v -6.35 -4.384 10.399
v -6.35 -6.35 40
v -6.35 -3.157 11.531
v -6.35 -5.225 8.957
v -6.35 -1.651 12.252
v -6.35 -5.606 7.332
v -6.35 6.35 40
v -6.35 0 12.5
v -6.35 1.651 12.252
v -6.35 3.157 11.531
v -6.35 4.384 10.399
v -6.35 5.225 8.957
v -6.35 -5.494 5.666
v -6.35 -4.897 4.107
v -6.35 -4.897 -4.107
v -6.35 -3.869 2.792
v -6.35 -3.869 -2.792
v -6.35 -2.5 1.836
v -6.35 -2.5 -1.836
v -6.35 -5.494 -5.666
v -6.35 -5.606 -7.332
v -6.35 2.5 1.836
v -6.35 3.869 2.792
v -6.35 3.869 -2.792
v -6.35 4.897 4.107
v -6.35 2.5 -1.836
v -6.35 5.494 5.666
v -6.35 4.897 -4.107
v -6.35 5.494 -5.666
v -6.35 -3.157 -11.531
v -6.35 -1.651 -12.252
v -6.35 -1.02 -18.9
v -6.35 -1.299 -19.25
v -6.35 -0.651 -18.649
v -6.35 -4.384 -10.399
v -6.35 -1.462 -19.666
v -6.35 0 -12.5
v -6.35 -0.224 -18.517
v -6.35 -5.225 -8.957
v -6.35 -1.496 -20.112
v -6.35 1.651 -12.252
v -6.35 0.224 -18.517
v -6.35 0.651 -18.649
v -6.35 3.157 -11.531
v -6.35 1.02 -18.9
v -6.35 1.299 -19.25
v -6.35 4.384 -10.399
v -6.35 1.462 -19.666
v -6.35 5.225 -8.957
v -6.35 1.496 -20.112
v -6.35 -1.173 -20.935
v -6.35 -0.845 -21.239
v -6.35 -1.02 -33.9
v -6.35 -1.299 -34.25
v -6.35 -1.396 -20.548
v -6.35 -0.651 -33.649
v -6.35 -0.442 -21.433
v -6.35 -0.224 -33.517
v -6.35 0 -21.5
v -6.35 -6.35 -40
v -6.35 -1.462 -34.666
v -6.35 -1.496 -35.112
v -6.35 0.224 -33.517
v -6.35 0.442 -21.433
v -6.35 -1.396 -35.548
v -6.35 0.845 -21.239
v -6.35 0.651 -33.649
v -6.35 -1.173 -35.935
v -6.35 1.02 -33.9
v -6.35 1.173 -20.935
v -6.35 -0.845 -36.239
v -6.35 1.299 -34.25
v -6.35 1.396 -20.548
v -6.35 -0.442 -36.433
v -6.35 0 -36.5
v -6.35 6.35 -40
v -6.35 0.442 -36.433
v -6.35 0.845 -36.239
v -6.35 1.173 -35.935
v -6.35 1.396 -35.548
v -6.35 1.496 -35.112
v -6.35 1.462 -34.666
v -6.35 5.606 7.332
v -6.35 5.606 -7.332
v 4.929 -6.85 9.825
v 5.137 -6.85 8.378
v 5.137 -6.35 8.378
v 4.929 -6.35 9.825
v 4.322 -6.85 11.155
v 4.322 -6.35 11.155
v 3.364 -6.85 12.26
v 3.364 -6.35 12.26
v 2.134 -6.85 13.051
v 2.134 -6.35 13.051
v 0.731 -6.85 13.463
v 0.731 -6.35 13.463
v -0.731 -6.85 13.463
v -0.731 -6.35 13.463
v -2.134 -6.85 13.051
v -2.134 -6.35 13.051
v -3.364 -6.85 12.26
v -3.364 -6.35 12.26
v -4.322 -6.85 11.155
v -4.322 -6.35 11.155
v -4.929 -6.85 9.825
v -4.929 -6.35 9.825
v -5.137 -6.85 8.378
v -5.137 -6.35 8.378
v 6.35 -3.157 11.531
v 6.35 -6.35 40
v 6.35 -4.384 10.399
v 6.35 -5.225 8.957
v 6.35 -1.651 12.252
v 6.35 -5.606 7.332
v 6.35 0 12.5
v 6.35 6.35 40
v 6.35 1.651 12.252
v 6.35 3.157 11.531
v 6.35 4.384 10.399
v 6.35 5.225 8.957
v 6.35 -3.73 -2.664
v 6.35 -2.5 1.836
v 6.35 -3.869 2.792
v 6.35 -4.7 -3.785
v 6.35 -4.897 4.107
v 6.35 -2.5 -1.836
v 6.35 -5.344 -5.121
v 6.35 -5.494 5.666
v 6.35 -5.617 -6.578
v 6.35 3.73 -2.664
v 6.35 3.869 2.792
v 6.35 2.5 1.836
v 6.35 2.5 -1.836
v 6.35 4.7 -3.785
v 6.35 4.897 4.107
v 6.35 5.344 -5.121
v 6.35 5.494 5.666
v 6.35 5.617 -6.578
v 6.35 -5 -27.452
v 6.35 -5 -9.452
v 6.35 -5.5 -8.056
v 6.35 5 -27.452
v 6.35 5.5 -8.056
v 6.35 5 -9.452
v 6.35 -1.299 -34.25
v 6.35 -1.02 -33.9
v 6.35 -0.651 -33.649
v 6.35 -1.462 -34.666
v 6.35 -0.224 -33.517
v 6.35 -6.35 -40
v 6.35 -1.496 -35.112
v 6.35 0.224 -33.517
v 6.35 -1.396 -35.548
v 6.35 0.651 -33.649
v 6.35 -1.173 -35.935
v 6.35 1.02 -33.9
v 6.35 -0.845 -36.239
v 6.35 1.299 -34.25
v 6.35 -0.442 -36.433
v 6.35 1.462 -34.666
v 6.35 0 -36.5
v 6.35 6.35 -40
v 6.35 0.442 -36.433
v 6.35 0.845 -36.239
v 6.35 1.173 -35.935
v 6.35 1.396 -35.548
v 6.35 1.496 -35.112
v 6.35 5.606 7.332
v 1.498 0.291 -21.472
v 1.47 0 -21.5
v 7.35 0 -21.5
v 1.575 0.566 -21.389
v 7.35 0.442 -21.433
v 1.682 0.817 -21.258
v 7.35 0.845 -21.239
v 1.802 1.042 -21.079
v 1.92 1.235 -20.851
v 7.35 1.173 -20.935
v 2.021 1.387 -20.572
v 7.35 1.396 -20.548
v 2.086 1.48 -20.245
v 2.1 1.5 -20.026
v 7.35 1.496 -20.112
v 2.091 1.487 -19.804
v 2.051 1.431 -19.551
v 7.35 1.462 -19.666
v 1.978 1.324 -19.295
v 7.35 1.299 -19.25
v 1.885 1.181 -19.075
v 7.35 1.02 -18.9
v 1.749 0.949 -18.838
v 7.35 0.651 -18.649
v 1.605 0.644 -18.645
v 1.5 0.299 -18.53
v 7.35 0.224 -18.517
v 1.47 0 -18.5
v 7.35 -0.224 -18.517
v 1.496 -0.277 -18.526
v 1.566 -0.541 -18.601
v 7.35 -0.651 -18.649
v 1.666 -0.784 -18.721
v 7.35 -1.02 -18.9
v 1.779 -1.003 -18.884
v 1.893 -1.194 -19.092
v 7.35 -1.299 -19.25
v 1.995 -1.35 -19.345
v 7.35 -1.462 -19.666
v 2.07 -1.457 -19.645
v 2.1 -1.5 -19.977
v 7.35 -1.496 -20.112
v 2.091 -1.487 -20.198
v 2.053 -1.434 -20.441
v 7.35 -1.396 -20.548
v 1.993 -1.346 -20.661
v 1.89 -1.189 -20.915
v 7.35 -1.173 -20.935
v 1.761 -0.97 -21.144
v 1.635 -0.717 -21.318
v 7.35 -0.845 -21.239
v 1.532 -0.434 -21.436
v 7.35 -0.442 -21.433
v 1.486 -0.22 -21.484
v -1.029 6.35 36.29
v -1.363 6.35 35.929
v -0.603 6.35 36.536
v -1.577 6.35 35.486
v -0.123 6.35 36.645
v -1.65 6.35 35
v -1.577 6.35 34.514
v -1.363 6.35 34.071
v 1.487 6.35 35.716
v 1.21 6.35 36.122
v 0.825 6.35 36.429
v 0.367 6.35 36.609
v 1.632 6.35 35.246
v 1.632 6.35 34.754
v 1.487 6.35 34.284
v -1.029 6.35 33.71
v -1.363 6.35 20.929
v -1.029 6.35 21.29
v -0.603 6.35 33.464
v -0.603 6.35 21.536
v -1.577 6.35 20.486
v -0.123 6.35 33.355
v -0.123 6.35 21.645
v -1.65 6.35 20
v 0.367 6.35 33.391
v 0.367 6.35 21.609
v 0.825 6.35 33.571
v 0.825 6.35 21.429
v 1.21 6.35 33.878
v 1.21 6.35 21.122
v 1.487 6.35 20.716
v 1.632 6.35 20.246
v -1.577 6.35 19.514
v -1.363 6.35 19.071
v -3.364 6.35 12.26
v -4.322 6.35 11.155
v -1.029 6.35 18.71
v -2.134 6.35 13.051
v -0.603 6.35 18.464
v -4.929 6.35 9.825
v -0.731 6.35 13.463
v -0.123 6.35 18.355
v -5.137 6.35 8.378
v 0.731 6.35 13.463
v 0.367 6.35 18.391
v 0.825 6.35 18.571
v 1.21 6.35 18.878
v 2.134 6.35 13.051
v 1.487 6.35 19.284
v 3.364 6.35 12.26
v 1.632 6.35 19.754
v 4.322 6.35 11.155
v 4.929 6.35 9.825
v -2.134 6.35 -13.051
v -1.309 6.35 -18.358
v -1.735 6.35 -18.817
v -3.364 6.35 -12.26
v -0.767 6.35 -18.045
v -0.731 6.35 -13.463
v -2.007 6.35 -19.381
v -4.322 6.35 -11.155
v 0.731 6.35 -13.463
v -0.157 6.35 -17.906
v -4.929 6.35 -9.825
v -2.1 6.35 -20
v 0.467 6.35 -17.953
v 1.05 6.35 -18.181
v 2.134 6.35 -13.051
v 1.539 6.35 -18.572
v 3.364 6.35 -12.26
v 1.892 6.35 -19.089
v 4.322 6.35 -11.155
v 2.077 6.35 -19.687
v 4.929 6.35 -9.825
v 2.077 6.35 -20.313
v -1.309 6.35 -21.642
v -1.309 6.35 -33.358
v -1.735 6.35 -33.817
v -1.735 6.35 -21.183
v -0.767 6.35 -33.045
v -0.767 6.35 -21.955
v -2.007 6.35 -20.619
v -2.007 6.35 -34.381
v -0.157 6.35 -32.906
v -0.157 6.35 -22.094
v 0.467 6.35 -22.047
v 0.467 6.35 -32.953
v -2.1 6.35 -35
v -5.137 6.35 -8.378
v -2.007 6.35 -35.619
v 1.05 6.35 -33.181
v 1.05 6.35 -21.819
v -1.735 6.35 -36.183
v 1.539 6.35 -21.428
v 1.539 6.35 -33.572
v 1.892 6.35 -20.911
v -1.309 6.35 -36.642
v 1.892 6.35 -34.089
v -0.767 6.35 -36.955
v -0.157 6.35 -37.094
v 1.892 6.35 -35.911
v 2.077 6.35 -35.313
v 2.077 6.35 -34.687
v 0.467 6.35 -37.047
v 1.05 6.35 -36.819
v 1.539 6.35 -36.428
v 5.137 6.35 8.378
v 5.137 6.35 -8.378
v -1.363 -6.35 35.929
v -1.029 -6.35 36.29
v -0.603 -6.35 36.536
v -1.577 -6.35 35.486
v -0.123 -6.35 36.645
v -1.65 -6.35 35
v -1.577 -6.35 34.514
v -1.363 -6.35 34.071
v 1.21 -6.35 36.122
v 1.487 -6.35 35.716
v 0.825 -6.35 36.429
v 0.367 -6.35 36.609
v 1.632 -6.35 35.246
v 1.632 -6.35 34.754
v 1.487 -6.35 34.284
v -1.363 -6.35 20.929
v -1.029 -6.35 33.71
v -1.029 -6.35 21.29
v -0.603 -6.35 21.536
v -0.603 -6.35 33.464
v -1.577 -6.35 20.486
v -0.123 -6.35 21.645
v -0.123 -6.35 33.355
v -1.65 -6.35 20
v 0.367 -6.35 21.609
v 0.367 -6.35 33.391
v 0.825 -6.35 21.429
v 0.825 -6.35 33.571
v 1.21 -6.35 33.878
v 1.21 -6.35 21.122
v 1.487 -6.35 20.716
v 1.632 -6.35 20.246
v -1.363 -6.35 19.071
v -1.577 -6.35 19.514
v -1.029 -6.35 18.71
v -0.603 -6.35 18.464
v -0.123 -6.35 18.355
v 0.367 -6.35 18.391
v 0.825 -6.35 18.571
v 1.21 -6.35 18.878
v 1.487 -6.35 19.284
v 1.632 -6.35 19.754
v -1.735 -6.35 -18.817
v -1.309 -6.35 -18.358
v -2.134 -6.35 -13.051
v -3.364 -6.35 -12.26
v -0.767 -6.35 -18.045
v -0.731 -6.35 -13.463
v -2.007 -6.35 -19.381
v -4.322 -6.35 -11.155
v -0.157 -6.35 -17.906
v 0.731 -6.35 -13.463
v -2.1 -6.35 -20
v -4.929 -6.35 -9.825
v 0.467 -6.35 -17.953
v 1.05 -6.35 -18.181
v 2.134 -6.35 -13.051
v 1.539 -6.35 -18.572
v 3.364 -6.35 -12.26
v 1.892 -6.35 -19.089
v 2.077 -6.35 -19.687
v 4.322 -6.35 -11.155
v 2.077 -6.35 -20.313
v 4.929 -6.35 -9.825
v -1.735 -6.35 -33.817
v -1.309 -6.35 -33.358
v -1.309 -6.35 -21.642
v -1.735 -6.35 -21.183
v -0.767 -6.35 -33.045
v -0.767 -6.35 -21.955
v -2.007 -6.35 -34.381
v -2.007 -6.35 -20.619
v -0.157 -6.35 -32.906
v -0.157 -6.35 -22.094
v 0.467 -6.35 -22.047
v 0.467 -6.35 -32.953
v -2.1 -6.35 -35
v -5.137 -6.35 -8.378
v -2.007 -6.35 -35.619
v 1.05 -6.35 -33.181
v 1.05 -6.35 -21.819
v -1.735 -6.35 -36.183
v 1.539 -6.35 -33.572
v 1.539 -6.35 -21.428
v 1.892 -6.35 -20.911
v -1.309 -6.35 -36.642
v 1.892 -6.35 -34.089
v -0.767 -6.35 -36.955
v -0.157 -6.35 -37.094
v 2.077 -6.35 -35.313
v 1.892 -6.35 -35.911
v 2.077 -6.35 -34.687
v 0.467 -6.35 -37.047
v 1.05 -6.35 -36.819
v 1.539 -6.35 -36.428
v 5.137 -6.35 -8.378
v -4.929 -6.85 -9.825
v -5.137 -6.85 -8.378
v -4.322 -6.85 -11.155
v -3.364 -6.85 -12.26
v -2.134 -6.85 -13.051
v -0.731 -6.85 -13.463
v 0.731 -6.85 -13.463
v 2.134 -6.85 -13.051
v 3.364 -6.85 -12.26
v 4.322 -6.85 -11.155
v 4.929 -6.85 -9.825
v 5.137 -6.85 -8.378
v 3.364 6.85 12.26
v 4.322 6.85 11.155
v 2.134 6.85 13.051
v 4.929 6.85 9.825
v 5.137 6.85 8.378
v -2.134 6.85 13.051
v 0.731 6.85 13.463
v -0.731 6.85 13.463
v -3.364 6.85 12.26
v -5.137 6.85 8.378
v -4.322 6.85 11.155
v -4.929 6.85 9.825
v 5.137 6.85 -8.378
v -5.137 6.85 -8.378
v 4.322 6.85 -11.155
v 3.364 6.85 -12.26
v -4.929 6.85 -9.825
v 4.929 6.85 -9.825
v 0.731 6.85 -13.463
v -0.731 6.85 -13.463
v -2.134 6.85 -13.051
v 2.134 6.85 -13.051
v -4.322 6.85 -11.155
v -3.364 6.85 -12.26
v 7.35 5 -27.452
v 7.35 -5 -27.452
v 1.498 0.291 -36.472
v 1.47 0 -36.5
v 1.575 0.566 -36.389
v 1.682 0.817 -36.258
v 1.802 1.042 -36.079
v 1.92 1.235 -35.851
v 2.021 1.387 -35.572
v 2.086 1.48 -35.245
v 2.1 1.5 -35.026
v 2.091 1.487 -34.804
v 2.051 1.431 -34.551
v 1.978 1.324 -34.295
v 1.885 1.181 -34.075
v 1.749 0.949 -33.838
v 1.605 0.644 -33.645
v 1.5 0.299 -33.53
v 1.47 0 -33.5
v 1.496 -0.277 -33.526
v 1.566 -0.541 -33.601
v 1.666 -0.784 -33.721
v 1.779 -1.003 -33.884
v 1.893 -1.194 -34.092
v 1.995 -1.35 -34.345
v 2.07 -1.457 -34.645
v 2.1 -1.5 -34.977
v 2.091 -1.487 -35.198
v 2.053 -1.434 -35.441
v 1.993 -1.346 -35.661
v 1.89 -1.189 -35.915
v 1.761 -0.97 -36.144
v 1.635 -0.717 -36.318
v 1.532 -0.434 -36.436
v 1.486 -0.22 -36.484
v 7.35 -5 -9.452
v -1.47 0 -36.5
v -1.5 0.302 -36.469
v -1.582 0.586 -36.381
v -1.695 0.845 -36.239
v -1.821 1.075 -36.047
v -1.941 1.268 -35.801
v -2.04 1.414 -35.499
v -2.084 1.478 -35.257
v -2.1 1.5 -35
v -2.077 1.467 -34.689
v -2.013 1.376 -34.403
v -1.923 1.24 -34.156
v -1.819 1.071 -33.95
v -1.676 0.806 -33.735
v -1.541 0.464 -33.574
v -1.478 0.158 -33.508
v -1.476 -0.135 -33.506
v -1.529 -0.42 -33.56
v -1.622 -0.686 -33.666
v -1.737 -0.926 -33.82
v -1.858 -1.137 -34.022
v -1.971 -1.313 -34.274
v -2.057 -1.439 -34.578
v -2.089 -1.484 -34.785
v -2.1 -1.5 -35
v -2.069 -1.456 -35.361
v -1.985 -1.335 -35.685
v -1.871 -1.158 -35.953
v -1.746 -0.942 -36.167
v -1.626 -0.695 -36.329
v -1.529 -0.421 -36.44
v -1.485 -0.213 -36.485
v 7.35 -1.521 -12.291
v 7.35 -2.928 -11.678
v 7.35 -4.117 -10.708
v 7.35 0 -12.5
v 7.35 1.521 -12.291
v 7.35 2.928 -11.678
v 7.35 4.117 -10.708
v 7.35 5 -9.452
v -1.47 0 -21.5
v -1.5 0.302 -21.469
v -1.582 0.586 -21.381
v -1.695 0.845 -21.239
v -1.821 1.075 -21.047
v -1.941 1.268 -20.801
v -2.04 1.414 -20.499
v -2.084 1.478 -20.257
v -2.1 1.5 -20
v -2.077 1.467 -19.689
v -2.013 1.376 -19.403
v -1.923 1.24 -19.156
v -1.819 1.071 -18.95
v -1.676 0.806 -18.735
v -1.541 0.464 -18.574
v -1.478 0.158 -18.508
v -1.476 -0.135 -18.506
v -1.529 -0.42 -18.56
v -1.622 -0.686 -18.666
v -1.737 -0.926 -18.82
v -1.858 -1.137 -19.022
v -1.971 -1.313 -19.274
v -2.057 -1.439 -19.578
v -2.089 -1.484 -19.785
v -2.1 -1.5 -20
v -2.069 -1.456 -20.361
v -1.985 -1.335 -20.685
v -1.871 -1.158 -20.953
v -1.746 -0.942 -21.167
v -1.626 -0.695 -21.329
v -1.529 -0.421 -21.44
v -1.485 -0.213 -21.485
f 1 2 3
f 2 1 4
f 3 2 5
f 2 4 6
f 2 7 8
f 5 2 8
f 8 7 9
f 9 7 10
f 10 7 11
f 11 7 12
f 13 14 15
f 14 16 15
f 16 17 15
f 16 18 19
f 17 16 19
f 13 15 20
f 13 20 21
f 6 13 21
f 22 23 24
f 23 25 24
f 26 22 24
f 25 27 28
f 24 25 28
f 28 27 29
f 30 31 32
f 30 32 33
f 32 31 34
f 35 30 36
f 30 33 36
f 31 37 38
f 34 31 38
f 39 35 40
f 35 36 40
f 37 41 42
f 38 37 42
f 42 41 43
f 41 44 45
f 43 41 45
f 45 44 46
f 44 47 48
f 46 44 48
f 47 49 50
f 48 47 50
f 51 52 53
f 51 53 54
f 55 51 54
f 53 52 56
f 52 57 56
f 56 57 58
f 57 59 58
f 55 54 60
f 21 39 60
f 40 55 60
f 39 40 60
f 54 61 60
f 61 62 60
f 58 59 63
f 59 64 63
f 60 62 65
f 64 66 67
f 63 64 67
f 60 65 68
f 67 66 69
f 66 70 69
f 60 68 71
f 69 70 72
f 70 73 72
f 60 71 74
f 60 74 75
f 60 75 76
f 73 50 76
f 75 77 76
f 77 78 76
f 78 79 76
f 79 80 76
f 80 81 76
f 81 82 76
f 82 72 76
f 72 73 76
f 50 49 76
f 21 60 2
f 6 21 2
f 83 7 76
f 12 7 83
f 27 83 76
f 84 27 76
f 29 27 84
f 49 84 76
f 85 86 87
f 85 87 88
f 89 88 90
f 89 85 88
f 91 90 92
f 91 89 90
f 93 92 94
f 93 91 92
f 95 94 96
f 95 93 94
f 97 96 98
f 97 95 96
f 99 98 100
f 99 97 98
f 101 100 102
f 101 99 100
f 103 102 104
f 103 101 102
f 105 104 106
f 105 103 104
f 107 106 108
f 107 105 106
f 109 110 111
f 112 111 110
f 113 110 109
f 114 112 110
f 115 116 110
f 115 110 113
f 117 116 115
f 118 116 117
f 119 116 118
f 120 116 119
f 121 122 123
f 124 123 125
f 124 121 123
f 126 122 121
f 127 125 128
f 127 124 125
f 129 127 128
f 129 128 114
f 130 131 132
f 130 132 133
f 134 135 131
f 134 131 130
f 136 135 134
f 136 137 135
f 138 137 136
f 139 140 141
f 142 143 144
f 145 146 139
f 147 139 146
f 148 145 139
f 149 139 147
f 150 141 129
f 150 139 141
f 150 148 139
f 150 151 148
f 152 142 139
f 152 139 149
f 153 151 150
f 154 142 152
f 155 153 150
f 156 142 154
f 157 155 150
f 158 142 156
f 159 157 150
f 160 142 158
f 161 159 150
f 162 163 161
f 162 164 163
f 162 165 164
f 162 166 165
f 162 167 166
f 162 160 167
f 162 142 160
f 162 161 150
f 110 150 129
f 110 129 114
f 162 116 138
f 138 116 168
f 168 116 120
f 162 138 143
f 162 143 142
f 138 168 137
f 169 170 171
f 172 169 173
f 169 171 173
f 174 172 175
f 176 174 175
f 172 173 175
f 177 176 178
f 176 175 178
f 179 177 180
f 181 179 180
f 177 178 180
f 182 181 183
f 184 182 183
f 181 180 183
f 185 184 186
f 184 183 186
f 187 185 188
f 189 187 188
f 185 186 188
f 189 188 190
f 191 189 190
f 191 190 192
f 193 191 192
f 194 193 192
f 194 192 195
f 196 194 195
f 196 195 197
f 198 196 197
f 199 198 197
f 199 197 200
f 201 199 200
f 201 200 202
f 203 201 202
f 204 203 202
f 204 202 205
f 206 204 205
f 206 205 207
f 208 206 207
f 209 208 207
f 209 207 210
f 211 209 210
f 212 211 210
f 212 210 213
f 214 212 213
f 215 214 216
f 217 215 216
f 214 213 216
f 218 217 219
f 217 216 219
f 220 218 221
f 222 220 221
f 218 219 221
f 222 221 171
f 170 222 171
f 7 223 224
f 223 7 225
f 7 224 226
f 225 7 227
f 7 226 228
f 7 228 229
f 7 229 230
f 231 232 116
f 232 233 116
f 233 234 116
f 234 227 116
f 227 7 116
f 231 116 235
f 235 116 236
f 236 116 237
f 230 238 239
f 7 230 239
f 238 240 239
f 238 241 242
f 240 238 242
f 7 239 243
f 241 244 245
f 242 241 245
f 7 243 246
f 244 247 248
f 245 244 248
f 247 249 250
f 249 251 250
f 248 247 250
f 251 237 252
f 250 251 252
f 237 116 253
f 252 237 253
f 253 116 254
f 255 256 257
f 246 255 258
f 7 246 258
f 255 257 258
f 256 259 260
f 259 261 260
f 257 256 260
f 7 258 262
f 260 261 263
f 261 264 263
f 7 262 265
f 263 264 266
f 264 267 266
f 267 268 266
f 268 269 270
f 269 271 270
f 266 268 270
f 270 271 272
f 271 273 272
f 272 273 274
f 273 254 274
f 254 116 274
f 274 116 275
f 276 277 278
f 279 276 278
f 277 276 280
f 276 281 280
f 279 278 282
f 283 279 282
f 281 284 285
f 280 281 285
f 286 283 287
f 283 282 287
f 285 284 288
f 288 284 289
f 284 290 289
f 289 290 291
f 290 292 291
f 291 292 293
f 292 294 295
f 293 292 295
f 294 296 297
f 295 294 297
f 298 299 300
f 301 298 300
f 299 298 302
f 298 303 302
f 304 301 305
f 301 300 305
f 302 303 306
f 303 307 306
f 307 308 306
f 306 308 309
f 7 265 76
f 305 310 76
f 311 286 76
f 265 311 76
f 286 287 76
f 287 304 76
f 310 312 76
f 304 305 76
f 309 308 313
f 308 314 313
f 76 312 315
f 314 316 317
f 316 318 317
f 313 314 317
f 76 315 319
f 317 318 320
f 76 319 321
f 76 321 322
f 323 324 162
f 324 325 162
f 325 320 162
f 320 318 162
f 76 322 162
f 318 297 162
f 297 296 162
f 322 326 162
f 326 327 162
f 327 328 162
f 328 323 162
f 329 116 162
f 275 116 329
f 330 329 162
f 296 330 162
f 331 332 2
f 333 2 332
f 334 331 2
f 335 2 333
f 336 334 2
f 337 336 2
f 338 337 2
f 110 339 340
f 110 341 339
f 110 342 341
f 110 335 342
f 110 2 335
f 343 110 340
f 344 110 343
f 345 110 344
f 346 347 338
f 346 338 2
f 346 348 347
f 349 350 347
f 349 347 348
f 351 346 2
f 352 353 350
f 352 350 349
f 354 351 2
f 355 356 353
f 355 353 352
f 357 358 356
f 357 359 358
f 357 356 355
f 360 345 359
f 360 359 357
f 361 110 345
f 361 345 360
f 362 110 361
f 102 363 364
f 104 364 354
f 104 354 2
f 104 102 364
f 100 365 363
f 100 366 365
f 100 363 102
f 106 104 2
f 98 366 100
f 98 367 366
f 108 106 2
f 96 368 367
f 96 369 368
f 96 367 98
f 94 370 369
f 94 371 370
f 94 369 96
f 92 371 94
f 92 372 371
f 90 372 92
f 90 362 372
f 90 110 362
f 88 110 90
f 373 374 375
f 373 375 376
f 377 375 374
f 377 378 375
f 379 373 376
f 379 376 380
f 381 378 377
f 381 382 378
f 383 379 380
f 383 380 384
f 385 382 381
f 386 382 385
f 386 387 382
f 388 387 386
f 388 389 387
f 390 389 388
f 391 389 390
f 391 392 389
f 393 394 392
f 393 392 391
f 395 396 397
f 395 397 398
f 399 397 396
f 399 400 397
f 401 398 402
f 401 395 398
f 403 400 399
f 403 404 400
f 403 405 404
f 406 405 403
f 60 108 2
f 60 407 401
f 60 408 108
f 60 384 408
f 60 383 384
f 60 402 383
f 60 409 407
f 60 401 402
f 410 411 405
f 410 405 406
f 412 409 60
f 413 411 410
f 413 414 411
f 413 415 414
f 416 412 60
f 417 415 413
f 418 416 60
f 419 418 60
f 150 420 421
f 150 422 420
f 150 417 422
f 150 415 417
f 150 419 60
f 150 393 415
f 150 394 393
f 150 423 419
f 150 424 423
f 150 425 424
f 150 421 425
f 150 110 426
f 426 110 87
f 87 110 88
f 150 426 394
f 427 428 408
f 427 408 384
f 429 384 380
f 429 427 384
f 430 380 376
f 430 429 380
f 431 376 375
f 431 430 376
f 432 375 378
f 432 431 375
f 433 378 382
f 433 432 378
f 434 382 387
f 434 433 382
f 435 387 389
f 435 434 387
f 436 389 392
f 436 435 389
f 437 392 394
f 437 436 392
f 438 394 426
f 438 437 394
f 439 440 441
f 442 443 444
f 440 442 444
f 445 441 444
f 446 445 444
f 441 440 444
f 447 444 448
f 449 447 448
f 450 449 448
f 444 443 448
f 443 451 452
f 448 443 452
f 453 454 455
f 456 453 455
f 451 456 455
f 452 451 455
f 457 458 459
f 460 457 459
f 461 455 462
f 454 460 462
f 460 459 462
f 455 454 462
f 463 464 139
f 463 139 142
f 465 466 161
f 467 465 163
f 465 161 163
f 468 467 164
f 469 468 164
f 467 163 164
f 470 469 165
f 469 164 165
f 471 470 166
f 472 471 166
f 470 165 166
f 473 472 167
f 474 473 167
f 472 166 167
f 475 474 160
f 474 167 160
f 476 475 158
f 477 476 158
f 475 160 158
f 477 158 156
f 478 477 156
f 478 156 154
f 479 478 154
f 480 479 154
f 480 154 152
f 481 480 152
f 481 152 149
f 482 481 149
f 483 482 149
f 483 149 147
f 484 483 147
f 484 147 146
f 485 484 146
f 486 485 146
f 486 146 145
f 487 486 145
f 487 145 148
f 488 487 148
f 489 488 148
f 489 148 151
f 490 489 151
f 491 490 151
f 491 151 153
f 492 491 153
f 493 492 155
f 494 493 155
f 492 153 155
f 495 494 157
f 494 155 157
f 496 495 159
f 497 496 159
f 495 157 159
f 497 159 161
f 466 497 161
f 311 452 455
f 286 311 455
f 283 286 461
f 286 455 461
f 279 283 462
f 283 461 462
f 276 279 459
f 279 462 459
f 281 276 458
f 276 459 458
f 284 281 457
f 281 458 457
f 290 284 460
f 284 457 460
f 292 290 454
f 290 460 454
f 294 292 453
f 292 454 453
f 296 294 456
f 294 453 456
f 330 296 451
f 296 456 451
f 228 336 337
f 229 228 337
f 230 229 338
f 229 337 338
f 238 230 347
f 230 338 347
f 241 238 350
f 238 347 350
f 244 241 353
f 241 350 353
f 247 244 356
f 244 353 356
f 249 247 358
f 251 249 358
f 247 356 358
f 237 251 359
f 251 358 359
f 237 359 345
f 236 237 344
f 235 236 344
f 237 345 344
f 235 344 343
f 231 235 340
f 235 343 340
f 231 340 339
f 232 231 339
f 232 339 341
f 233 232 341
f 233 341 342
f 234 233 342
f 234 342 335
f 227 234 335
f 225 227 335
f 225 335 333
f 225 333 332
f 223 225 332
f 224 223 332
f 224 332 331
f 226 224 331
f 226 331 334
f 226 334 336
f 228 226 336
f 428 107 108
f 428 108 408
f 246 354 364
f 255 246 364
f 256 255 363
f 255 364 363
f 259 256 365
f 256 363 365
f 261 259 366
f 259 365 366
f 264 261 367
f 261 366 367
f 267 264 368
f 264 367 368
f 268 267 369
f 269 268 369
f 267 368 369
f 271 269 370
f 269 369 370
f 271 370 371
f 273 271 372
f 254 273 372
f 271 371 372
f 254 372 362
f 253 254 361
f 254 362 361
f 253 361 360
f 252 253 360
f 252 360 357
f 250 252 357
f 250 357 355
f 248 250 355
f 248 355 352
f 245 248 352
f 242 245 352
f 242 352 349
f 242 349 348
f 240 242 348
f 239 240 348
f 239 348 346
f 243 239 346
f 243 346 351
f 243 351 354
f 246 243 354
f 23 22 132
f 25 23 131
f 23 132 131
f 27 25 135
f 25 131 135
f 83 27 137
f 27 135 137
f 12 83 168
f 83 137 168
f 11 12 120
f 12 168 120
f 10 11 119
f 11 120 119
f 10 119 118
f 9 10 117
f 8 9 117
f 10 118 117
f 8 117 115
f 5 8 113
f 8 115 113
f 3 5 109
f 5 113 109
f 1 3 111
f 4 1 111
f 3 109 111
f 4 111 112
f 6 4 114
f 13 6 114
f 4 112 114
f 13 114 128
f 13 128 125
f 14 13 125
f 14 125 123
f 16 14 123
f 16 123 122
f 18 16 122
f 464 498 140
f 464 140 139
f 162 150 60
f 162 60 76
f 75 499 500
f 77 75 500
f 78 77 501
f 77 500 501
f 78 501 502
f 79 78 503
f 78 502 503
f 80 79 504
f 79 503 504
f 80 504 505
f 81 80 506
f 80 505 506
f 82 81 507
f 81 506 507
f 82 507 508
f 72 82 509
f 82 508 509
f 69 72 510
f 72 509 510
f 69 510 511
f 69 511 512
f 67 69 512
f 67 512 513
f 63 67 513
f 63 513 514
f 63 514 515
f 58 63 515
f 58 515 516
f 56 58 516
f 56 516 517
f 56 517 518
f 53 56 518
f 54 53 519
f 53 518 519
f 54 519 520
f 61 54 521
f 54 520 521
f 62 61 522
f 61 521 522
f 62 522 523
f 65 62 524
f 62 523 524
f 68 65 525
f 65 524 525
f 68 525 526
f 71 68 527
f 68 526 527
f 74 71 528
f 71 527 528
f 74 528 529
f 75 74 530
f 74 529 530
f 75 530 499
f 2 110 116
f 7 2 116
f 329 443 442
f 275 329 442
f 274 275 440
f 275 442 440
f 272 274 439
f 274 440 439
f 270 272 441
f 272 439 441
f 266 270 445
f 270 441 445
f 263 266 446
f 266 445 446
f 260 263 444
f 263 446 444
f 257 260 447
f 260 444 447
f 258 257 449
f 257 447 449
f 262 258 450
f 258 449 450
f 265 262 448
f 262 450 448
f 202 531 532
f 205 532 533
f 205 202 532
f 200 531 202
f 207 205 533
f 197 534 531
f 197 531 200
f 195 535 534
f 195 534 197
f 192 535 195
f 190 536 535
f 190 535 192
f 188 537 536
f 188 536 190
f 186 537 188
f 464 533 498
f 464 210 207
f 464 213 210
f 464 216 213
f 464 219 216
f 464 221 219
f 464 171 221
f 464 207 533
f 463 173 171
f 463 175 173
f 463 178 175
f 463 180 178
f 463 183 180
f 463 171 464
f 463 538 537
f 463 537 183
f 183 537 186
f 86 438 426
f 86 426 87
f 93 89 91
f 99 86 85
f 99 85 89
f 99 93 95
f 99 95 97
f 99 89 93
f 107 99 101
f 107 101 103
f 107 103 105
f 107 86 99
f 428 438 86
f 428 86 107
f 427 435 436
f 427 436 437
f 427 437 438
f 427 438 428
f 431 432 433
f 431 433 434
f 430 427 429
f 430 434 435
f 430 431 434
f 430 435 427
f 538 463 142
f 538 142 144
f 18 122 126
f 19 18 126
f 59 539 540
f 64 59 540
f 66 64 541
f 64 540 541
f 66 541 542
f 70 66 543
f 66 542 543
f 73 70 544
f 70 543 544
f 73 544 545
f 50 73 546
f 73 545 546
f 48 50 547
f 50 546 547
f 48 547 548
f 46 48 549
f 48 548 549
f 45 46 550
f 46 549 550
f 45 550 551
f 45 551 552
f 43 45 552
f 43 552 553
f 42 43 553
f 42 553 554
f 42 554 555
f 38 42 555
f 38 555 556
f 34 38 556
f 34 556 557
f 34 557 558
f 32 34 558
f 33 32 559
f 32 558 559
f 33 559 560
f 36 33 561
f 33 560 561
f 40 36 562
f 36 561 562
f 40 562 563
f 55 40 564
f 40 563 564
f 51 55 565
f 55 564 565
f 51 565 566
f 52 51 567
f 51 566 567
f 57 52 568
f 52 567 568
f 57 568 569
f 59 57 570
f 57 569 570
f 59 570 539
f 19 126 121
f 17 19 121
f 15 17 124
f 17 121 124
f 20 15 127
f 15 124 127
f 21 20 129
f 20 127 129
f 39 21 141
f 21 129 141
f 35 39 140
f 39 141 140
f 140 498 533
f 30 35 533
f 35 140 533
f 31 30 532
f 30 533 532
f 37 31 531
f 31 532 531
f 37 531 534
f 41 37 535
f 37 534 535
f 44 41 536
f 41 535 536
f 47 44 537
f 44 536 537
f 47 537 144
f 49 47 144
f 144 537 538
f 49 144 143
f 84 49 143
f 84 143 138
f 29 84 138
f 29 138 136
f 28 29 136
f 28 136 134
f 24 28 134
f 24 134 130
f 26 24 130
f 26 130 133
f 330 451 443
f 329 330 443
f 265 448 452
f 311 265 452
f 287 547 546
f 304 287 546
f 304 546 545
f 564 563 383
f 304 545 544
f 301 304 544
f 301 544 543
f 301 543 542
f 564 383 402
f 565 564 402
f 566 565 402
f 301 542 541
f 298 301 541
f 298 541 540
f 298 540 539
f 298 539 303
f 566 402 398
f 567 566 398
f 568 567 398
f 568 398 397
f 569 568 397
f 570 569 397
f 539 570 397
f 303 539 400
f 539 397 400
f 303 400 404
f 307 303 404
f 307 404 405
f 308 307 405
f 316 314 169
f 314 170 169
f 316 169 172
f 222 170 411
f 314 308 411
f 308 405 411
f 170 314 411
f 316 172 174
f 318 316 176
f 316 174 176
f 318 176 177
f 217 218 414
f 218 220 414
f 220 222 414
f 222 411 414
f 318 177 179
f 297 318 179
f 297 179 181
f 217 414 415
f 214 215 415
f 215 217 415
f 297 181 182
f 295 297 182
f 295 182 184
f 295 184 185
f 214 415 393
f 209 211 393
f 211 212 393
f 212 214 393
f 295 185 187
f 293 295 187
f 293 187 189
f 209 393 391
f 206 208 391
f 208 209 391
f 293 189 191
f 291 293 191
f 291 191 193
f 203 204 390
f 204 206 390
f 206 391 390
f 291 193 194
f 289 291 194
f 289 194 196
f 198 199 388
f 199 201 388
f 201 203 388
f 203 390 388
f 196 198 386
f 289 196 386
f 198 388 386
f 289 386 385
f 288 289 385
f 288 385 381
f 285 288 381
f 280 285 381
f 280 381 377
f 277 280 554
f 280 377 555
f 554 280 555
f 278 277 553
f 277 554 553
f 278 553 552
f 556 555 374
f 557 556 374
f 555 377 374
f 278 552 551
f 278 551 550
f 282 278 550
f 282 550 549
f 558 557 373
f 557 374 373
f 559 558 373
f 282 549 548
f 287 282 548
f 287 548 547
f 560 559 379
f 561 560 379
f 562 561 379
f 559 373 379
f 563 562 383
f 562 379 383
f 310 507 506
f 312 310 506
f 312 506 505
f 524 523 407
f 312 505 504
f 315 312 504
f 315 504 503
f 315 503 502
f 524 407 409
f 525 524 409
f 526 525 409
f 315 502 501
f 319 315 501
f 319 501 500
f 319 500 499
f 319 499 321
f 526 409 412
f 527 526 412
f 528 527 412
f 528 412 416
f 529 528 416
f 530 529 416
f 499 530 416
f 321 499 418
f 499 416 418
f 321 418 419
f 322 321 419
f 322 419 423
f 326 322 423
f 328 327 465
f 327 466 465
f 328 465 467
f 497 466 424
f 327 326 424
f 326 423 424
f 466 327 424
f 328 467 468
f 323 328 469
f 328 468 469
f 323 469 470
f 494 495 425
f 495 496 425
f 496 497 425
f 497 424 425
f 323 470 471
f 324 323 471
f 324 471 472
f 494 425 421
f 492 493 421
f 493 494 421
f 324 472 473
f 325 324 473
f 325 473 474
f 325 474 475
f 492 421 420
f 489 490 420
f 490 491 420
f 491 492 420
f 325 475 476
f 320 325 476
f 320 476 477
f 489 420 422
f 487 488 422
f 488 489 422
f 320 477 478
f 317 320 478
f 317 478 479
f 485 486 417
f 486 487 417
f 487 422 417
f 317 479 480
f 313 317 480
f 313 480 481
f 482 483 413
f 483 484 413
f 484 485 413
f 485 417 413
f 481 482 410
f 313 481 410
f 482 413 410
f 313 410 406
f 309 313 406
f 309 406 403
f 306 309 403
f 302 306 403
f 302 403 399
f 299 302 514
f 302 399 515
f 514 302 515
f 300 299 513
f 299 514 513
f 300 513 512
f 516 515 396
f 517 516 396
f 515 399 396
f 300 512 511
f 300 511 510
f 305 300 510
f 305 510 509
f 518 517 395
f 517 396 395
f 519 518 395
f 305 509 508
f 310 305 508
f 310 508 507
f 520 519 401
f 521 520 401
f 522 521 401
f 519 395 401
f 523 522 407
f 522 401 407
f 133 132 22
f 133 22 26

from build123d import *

# Parameters (mm, degrees)
SKETCH1_W               = 80
SKETCH1_H               = 12.7
BOSS_EXTRUDE1_DEPTH     = 6.35
SKETCH2_R               = 5.625
CUT_EXTRUDE1_DEPTH      = 7.35
CUT_EXTRUDE1_DEPTH_BACK = 7.35
SKETCH3_W               = 23.827822186
SKETCH3_H               = 5
CUT_EXTRUDE2_DEPTH      = 7.35
CUT_EXTRUDE2_DEPTH_BACK = 7.35
M4X0_7_TAPPED_HOLE1_D   = 3.3
GOO_DEPTH               = 0.5
BOSS_EXTRUDE5_DEPTH     = 1
F_3_0MM_DOWEL_HOLE1_D   = 3
M5X0_8_TAPPED_HOLE1_D   = 4.2


with BuildPart() as part:
    # Sketch1 → Boss-Extrude1 (new body, symmetric)
    with BuildSketch(Plane(origin=(0, 0, 0), x_dir=(0, 0, -1), z_dir=(1, 0, 0))):
        Rectangle(SKETCH1_W, SKETCH1_H)
    extrude(amount=BOSS_EXTRUDE1_DEPTH, both=True)

    # Sketch2 → Cut-Extrude1 (cut, two sides)
    with BuildSketch(Plane(origin=(0, 0, 0), x_dir=(0, 0, -1), z_dir=(1, 0, 0))) as cut_extrude1_sk:
        with Locations((-6.875, 0)):
            Circle(SKETCH2_R)
        with Locations((6.875, 0)):
            Circle(SKETCH2_R)
    extrude(amount=CUT_EXTRUDE1_DEPTH, mode=Mode.SUBTRACT)
    extrude(cut_extrude1_sk.sketch, amount=-CUT_EXTRUDE1_DEPTH_BACK, mode=Mode.SUBTRACT)

    # Sketch3 → Cut-Extrude2 (cut, two sides)
    with BuildSketch(Plane(origin=(0, 0, 0), x_dir=(0, 0, -1), z_dir=(1, 0, 0))) as cut_extrude2_sk:
        Rectangle(SKETCH3_W, SKETCH3_H)
    extrude(amount=CUT_EXTRUDE2_DEPTH, mode=Mode.SUBTRACT)
    extrude(cut_extrude2_sk.sketch, amount=-CUT_EXTRUDE2_DEPTH_BACK, mode=Mode.SUBTRACT)

    # M4x0.7 Tapped Hole1 (through all)
    with Locations(Plane(origin=(0, 6.35, 0), x_dir=(1, 0, 0), z_dir=(0, 1, 0))):
        with Locations((0, 35), (0, 20), (0, -20), (0, -35)):
            Hole(M4X0_7_TAPPED_HOLE1_D / 2)

    # Sketch8 → Goo (add, symmetric)
    with BuildSketch(Plane(origin=(0, 6.35, 0), x_dir=(1, 0, 0), z_dir=(0, 1, 0))):
        with BuildLine():
            Line((-5.13731221, -8.377770681), (-5.13731221, 8.377770681))
            ThreePointArc((-5.13731221, 8.377770681), (0, 13.515082891), (5.13731221, 8.377770681))
            Line((5.13731221, 8.377770681), (5.13731221, -8.377770681))
            ThreePointArc((5.13731221, -8.377770681), (0, -13.515082891), (-5.13731221, -8.377770681))
        make_face()
    goo = extrude(amount=GOO_DEPTH, both=True)

    # Mirror1: Goo across plane
    add(goo.mirror(Plane.ZX))

    # Sketch9 → Boss-Extrude5 (add, symmetric)
    with BuildSketch(Plane(origin=(6.35, 0, 0), x_dir=(0, 0, -1), z_dir=(1, 0, 0))):
        with BuildLine():
            Line((9.451941016, -5), (27.451941016, -5))
            Line((27.451941016, -5), (27.451941016, 5))
            Line((27.451941016, 5), (9.451941016, 5))
            ThreePointArc((9.451941016, 5), (12.5, 0), (9.451941016, -5))
        make_face()
    extrude(amount=BOSS_EXTRUDE5_DEPTH, both=True)

    # Ø3.0mm Dowel Hole1 (through all)
    with Locations(Plane.ZY.offset(6.35)):
        with Locations((-20, 0), (-35, 0)):
            Hole(F_3_0MM_DOWEL_HOLE1_D / 2)

    # M5x0.8 Tapped Hole1 (through all)
    with Locations(Plane(origin=(0, 6.35, 0), x_dir=(1, 0, 0), z_dir=(0, 1, 0))):
        with Locations((0, 35), (0, 20)):
            Hole(M5X0_8_TAPPED_HOLE1_D / 2)


solid = part.part
